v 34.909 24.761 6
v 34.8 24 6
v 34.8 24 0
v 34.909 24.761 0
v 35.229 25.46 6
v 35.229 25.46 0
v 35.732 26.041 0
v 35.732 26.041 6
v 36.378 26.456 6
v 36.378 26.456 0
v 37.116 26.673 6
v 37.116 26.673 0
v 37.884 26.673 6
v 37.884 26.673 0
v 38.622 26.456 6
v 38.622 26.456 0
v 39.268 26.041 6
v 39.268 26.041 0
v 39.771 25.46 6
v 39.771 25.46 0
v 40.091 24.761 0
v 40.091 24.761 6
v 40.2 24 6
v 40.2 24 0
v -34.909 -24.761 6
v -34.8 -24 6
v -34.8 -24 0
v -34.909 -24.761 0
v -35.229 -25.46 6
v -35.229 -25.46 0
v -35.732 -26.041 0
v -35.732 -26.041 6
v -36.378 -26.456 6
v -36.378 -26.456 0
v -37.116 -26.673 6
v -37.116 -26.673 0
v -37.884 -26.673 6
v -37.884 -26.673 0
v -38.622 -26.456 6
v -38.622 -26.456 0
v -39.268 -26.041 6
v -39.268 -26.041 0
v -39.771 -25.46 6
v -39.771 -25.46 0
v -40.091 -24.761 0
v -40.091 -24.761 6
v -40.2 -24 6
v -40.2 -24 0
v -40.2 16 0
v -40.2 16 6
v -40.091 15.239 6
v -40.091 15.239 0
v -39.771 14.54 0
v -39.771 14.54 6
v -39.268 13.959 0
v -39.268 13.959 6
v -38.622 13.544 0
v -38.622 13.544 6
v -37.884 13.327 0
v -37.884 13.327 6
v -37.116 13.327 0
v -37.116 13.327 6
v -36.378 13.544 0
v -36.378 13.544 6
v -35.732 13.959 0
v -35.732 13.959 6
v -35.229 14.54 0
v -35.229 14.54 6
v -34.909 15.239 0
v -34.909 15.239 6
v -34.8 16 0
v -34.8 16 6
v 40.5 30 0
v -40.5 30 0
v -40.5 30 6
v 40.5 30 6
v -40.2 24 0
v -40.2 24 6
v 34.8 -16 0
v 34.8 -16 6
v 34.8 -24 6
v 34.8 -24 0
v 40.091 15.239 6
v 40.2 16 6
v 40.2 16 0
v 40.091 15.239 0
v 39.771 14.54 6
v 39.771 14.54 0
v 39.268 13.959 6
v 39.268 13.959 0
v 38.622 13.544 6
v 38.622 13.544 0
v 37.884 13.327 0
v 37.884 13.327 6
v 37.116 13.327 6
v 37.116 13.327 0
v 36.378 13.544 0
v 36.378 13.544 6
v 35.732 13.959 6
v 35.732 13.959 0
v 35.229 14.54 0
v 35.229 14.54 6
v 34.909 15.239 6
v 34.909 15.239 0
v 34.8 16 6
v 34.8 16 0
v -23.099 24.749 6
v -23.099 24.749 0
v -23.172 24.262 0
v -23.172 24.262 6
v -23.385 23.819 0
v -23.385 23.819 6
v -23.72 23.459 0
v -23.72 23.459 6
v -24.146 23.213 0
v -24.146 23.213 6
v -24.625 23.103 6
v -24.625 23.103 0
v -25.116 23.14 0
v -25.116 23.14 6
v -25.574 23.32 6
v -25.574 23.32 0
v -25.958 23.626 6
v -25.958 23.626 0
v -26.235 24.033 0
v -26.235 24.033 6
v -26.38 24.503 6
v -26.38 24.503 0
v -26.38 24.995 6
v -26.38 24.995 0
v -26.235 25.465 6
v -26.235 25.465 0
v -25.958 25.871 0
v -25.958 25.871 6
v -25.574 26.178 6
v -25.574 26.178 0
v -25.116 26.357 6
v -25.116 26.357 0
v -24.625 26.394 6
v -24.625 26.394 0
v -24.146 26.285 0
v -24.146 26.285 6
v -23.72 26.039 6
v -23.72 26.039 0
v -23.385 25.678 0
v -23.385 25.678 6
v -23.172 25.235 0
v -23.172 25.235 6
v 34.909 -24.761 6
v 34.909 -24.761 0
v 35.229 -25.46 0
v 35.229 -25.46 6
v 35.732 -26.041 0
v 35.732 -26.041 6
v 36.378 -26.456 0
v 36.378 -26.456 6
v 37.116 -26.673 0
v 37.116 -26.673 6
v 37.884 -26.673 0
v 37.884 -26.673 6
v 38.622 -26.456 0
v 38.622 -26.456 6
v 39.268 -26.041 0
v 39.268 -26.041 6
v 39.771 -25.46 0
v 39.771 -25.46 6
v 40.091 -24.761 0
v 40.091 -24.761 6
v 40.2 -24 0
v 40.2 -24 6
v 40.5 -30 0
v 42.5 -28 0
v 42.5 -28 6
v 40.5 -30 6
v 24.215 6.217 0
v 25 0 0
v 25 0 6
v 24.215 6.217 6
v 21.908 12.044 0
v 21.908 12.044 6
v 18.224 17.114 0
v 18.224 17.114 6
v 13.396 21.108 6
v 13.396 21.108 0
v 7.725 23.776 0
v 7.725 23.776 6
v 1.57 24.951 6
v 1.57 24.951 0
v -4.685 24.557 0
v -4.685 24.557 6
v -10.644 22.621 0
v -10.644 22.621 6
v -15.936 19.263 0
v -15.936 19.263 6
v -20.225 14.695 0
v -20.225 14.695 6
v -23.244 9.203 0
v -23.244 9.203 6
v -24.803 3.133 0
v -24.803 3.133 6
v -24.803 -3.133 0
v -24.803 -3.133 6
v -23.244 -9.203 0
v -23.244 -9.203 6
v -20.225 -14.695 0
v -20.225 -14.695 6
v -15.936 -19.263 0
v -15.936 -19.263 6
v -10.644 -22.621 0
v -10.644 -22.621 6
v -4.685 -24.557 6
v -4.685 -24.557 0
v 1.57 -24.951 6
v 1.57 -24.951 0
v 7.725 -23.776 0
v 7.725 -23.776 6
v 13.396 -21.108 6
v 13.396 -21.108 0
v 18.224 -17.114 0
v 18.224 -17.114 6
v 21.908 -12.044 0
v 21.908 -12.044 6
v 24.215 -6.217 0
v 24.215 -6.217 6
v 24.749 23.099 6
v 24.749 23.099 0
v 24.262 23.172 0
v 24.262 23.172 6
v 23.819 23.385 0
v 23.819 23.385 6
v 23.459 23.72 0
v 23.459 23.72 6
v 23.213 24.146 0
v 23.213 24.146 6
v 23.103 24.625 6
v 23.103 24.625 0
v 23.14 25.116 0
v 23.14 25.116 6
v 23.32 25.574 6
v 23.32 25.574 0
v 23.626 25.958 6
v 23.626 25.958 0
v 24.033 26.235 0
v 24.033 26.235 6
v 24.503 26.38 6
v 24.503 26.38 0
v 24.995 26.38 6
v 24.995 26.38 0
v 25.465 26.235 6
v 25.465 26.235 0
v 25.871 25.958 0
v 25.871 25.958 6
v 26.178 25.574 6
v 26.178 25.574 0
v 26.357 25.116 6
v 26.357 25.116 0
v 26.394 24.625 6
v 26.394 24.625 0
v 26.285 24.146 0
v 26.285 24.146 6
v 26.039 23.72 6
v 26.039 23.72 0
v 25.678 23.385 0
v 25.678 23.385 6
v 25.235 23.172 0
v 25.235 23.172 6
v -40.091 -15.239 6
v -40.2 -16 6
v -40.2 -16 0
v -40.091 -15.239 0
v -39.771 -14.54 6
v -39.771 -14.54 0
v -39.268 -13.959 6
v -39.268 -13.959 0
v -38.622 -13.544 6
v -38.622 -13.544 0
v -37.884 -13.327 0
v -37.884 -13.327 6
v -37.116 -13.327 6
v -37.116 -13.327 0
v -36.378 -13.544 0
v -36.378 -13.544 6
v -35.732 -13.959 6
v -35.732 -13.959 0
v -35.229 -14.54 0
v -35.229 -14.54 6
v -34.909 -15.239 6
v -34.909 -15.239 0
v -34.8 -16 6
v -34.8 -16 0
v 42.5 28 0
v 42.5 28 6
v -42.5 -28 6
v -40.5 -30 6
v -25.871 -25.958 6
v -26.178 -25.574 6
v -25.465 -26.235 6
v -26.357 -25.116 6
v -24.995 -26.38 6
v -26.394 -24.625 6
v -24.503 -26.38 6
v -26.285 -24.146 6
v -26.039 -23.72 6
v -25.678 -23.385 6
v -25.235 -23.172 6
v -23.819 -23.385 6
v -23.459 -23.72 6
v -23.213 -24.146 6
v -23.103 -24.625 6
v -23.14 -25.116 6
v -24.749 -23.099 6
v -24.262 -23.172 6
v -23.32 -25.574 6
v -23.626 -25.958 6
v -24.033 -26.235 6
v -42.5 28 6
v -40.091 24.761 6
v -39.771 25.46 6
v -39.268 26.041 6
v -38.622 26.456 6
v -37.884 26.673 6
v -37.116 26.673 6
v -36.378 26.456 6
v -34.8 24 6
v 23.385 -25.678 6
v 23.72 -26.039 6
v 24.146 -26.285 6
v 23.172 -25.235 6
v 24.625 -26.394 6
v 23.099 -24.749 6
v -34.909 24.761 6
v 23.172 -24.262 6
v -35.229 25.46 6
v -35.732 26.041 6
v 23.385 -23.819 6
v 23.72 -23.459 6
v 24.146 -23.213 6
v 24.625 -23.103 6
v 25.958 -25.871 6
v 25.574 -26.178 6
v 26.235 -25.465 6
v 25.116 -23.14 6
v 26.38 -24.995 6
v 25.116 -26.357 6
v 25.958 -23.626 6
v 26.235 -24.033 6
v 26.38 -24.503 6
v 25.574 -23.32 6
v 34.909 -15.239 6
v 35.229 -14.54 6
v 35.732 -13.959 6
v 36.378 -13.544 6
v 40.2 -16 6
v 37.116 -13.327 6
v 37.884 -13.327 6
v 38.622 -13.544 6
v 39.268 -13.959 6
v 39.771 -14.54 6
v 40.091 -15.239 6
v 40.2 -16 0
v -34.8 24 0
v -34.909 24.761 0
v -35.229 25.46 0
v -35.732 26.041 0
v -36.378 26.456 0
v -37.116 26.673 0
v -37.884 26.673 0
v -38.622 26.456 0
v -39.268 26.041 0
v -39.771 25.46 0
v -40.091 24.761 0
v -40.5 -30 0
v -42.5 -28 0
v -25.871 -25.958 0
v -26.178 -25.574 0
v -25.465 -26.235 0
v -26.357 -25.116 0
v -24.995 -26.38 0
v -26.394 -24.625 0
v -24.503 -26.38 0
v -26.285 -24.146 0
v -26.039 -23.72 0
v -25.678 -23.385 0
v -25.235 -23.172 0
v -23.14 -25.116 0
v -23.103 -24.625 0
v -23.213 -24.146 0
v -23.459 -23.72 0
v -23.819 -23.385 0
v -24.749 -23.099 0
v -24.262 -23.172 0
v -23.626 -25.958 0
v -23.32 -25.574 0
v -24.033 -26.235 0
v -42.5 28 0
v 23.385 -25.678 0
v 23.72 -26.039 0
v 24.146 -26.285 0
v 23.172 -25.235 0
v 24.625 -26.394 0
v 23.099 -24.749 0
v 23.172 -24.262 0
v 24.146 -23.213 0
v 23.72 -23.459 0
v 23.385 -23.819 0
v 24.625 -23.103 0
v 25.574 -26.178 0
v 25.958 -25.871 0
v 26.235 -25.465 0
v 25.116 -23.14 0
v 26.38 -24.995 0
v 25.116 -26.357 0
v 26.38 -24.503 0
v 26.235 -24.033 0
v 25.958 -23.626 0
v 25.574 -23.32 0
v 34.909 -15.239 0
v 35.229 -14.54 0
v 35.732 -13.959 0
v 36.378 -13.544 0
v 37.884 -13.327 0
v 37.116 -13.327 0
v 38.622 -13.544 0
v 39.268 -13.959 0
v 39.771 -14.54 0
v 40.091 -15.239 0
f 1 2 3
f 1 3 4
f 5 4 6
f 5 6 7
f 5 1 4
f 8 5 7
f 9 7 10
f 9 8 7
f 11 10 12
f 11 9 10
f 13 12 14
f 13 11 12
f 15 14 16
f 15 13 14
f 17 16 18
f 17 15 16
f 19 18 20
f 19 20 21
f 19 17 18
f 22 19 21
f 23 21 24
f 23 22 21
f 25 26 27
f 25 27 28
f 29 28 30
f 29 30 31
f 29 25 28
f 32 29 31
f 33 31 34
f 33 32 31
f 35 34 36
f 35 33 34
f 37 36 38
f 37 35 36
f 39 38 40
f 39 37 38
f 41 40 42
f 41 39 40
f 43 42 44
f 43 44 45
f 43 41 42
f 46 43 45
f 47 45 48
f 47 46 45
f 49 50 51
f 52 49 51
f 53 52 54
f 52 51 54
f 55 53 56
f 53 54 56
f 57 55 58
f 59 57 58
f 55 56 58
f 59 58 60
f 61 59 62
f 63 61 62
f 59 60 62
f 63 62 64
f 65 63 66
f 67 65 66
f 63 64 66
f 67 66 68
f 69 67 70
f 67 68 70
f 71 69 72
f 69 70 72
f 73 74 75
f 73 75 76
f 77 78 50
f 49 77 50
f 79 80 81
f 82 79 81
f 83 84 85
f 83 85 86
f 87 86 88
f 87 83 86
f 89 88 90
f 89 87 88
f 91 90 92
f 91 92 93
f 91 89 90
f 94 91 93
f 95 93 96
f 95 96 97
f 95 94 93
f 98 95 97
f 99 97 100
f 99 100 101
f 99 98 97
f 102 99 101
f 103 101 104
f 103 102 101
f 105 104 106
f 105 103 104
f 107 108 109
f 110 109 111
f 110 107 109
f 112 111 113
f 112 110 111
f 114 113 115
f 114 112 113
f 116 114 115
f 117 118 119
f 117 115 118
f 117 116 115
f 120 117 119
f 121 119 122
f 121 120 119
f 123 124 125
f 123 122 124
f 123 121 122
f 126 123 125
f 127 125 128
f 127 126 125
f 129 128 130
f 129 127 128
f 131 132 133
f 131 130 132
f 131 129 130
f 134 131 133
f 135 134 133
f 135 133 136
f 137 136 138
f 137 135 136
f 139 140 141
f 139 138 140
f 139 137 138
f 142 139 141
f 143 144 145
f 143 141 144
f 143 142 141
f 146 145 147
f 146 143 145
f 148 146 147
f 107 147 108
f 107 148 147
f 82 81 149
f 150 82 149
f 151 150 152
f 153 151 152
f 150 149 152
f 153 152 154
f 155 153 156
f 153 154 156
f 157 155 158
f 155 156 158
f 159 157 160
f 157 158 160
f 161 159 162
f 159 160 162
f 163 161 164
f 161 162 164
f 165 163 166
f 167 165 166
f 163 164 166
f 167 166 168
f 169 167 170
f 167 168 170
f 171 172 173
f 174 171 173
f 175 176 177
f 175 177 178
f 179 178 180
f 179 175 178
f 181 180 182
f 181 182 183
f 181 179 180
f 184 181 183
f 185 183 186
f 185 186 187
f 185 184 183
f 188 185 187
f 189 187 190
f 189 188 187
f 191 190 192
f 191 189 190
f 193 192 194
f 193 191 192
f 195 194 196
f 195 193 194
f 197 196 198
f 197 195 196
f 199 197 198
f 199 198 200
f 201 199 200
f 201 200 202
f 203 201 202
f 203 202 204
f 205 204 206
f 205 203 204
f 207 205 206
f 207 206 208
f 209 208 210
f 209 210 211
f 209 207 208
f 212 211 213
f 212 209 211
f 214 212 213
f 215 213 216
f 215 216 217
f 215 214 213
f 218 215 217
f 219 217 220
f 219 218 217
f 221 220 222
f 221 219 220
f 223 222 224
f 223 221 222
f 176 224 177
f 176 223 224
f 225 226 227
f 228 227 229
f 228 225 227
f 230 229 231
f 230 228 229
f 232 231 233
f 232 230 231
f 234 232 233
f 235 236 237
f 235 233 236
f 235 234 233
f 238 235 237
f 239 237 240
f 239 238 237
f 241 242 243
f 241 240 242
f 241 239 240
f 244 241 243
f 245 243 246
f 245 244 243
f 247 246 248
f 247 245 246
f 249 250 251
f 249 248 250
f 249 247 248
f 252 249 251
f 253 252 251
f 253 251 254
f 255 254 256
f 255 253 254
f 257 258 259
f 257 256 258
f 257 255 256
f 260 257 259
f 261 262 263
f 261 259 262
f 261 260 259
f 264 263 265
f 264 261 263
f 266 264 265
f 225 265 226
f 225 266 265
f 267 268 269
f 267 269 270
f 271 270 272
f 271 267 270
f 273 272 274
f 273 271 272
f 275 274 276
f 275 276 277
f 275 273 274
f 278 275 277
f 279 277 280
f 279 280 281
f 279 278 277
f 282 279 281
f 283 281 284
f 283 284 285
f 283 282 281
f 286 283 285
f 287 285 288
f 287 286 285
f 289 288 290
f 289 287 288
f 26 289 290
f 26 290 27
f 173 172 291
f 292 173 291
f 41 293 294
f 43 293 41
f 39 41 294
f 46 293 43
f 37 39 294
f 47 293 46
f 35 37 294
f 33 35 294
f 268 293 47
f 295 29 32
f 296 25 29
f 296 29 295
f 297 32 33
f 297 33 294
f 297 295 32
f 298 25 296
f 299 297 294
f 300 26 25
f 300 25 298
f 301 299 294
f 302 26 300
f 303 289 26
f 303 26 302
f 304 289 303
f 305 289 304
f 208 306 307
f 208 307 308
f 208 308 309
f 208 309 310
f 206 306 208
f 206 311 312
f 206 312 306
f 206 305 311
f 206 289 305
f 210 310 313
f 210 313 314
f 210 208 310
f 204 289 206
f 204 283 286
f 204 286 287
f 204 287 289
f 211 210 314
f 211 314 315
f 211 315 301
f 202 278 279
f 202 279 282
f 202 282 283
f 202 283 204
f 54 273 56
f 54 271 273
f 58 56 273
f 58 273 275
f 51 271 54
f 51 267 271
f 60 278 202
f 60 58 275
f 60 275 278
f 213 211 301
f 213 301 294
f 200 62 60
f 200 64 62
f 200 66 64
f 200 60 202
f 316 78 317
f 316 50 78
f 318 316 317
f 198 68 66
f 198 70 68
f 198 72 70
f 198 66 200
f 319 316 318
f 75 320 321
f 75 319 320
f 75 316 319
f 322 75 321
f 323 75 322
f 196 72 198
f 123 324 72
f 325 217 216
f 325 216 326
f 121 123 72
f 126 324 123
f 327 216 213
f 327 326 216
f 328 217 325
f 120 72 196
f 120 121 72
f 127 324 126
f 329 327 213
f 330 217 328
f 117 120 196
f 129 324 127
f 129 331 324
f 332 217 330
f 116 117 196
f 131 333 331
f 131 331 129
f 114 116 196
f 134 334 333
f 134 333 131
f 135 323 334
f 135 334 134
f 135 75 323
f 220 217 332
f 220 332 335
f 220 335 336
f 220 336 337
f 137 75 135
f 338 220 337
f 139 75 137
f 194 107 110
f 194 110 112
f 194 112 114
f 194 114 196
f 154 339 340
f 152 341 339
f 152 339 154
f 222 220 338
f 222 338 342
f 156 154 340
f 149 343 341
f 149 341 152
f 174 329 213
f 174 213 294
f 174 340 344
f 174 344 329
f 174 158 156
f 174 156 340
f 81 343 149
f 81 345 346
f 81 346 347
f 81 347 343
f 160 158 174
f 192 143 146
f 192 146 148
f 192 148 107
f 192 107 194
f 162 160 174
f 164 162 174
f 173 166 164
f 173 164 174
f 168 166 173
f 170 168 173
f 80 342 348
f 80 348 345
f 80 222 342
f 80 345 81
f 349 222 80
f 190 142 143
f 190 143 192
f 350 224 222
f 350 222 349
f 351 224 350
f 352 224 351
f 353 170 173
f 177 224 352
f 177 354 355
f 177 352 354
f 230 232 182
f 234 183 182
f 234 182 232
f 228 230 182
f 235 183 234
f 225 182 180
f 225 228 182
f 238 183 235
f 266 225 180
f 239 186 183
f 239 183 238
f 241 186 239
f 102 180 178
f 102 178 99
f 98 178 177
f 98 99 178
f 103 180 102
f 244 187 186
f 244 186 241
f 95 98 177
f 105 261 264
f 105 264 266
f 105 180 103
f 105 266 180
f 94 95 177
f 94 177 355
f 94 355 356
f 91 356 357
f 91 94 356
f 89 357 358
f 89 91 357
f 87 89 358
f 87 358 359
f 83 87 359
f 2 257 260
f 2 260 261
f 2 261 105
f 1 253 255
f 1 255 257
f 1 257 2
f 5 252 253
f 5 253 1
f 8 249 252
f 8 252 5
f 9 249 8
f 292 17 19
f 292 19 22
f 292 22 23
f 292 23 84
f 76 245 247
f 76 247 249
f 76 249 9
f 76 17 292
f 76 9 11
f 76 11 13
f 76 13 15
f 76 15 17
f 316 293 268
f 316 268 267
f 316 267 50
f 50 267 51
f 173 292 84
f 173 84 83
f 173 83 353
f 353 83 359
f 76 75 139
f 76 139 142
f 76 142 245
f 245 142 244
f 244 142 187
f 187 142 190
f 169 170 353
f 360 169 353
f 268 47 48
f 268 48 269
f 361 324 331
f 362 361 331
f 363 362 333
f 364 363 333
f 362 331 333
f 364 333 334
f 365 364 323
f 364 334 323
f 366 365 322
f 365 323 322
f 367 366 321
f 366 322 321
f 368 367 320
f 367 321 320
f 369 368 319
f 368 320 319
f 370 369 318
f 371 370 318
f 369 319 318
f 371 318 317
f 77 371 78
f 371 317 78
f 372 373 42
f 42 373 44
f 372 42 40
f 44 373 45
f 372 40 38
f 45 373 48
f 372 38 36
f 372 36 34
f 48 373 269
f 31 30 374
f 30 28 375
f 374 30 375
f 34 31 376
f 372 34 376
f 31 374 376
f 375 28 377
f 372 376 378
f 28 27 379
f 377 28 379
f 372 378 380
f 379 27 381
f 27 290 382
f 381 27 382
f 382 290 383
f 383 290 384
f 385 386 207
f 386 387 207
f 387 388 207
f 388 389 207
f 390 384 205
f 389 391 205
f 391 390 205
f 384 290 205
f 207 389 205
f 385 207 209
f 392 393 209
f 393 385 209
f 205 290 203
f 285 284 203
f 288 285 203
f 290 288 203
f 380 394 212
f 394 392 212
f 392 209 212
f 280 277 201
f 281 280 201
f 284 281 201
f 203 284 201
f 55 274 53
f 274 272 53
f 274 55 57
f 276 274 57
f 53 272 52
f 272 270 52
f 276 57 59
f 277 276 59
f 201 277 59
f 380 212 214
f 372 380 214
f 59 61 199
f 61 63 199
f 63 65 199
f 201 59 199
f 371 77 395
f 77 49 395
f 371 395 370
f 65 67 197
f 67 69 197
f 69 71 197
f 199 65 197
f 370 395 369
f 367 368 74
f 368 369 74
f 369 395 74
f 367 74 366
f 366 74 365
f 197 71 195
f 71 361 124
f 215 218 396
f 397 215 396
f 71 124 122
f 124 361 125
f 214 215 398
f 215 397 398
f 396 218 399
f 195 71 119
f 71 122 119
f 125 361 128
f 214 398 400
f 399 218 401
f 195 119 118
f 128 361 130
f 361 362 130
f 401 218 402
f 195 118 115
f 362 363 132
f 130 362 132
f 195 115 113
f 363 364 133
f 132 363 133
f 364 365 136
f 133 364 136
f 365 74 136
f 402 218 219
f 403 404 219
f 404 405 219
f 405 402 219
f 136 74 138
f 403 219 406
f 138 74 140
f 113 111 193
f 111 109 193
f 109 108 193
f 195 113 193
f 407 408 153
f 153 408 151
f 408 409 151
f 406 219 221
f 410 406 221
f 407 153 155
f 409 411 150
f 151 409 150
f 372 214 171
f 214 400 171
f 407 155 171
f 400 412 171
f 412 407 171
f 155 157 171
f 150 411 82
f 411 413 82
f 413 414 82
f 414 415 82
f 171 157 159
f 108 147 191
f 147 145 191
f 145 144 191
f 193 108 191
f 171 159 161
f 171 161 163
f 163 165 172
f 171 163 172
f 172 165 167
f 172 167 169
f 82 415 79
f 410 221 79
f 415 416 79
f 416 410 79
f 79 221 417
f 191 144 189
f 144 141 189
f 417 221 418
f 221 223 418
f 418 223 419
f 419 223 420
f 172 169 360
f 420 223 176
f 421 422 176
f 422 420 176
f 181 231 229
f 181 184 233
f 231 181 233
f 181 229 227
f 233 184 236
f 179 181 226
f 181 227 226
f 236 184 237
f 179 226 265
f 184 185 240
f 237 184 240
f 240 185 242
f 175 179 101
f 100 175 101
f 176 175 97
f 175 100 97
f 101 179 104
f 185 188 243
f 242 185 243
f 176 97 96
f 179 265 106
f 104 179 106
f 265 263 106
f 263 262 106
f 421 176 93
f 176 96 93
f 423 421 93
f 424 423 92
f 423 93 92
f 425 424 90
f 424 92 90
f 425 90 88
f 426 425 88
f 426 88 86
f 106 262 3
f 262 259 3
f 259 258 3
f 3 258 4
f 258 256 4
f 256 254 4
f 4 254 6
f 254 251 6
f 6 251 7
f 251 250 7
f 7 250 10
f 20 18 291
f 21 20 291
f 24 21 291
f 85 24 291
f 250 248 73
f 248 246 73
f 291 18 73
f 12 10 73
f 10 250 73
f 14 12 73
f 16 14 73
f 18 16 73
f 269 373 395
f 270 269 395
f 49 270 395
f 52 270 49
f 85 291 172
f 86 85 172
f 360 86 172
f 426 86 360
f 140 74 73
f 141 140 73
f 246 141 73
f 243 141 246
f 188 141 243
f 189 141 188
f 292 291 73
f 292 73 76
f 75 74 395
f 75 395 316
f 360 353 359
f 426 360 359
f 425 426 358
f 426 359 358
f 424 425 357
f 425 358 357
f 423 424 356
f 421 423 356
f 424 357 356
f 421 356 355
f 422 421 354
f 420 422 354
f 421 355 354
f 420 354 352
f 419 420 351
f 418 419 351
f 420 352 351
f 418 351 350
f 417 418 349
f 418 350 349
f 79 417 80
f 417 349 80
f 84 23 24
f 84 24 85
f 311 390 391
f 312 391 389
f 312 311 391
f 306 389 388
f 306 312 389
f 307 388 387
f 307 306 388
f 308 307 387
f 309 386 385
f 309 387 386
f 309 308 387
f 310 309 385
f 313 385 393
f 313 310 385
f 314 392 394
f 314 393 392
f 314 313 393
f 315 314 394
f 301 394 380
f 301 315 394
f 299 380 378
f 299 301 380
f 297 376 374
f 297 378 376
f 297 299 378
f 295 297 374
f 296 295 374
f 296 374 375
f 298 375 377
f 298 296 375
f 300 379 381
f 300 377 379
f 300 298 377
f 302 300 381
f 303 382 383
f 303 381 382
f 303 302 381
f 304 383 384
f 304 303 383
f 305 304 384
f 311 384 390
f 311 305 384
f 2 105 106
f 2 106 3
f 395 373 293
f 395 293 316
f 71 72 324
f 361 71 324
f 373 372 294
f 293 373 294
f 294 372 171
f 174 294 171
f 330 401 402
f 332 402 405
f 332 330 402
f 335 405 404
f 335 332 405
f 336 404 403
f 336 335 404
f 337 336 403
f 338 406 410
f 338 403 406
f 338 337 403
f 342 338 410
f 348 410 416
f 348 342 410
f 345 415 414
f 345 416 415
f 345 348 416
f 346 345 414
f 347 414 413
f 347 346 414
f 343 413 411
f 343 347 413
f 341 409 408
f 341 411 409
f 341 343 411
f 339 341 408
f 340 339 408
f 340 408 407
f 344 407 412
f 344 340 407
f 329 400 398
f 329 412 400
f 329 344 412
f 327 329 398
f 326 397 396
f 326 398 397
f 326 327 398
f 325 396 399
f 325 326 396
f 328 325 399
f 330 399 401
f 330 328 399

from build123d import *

# Parameters (mm, degrees)
SKETCH_1_W               = 85
SKETCH_1_H               = 60
SKETCH_1_R               = 25
EXTRUDE_1_DEPTH          = 6
PATTERN_CIRCULAR_1_COUNT = 4
CUT_EXTRUDE_1_DEPTH      = 6
CHAMFER_1_SIZE           = 2


with BuildPart() as part:
    # 草图1 → 凸台-拉伸1 (new body)
    with BuildSketch(Plane.XY):
        Rectangle(SKETCH_1_W, SKETCH_1_H)
        Circle(SKETCH_1_R, mode=Mode.SUBTRACT)
    extrude(amount=EXTRUDE_1_DEPTH)

    # 草图2 → M4 螺纹孔1 (revolve, cut)
    with BuildSketch(Plane(origin=(24.748737342, 24.748737342, 6), x_dir=(0, -1, 0), z_dir=(1, 0, 0))):
        Polygon((0, 0), (0, 12.491420021), (1.65, 11.5), (1.65, 0), align=None)
    hole_wizard_m4_1 = revolve(axis=Axis((24.748737342, 24.748737342, 12.35), (0, 0, -1)), mode=Mode.SUBTRACT)

    # 阵列(圆周)1: M4 螺纹孔1 ×4 about axis
    pattern_circular_1_axis = Axis((0, 0, 0), (0, 0, 1))
    for i in range(1, PATTERN_CIRCULAR_1_COUNT):
        add(hole_wizard_m4_1.rotate(pattern_circular_1_axis, i * 360 / PATTERN_CIRCULAR_1_COUNT), mode=Mode.SUBTRACT)

    # 草图4 → 切除-拉伸1 (cut)
    with BuildSketch(Plane.XY.offset(6)):
        with BuildLine():
            Line((40.2, 24), (40.2, 16))
            ThreePointArc((40.2, 16), (37.5, 13.3), (34.8, 16))
            Line((34.8, 16), (34.8, 24))
            ThreePointArc((34.8, 24), (37.5, 26.7), (40.2, 24))
        make_face()
        with BuildLine():
            Line((40.2, -24), (40.2, -16))
            ThreePointArc((40.2, -16), (37.5, -13.3), (34.8, -16))
            Line((34.8, -16), (34.8, -24))
            ThreePointArc((34.8, -24), (37.5, -26.7), (40.2, -24))
        make_face()
        with BuildLine():
            Line((-40.2, 24), (-40.2, 16))
            ThreePointArc((-40.2, 16), (-37.5, 13.3), (-34.8, 16))
            Line((-34.8, 16), (-34.8, 24))
            ThreePointArc((-34.8, 24), (-37.5, 26.7), (-40.2, 24))
        make_face()
        with BuildLine():
            Line((-40.2, -24), (-40.2, -16))
            ThreePointArc((-40.2, -16), (-37.5, -13.3), (-34.8, -16))
            Line((-34.8, -16), (-34.8, -24))
            ThreePointArc((-34.8, -24), (-37.5, -26.7), (-40.2, -24))
        make_face()
    extrude(amount=-CUT_EXTRUDE_1_DEPTH, mode=Mode.SUBTRACT)

    # 倒角1
    chamfer_1_edges = [part.edges().sort_by_distance(p)[0] for p in [
        (42.5, -30, 3),
        (-42.5, -30, 3),
        (-42.5, 30, 3),
        (42.5, 30, 3),
    ]]
    chamfer(chamfer_1_edges, length=CHAMFER_1_SIZE)


solid = part.part
